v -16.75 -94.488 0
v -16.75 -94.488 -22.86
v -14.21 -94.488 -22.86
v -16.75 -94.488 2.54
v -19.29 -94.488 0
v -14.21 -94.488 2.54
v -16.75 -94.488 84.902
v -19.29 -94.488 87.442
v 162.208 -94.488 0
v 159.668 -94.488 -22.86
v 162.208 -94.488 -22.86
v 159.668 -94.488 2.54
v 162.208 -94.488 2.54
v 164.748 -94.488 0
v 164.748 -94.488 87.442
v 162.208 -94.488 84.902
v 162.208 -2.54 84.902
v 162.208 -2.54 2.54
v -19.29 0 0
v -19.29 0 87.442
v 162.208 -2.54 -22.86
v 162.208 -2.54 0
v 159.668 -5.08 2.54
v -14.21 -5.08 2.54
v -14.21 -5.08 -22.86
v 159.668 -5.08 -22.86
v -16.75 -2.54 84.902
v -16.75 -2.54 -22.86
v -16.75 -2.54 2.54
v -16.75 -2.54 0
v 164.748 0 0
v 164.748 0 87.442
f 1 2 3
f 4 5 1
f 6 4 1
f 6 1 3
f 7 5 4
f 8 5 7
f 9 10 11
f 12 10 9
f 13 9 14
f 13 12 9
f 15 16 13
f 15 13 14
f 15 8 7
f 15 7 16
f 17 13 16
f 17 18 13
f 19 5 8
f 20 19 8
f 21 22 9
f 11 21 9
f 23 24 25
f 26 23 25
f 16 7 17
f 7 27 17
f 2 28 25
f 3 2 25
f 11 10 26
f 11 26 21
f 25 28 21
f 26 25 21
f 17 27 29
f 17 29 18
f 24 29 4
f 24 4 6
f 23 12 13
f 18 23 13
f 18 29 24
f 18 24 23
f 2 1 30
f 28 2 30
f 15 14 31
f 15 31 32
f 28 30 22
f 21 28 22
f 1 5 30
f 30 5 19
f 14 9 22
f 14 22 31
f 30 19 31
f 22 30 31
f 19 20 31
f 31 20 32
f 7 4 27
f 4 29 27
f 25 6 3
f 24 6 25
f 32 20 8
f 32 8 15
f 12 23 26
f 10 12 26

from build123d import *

# Parameters (mm, degrees)
F0_W        = 184.0382497758
F0_H        = 87.4423235655
F1_DEPTH    = 94.488
F2_T        = -2.54
F3_DEPTH    = 25.4
F4_T        = 2.54
F4_T3_DEPTH = 97.028
F4_T5_DEPTH = 184.0382497758
F4_T7_DEPTH = 87.4423235655


# Not quite as in the source:
# - a shell that OpenCascade refuses in one call is made with other operations: the cavity is built on its own and cut out


with BuildPart() as f1:
    # F0 (on Front) → F1 (new body)
    with BuildSketch(Plane.XZ):
        with Locations((72.7289924398, 43.7211617827)):
            Rectangle(F0_W, F0_H)
    extrude(amount=F1_DEPTH)

    # F2
    f2_openings = [f1.faces().sort_by_distance(p)[0] for p in [
        (72.728992, -94.488, 43.721162),
    ]]
    offset(amount=F2_T, openings=f2_openings)

    # F3 (add): a face of the model
    f3_faces = [f1.faces().sort_by_distance(p)[0] for p in [
        (72.7289924398, -48.514, 2.54),
    ]]
    extrude(f3_faces, amount=-F3_DEPTH)

    # F4: shell of thickness 2.54, made by hand


with BuildPart() as f4_core1:
    # F4_t2: copy of F1
    add(f1.part)

    # the walls: a layer under each face that stays
    f4_faces = [f4_core1.faces().sort_by_distance(p)[0] for p in [
        (-19.2901324481, -47.244, 43.7211617827),
        (72.7289924398, -47.244, 87.4423235655),
        (104.36056662, -2.333037037, 0),
        (72.7289924398, 0, 43.7211617827),
        (164.7481173277, -47.244, 43.7211617827),
        (162.2081173277, -48.514, -11.43),
        (72.7289924398, -2.54, -11.43),
        (-16.7501324481, -48.514, -11.43),
        (162.2081173277, -48.514, 43.7211617827),
        (72.7289924398, -48.514, 84.9023235655),
        (-16.7501324481, -48.514, 43.7211617827),
        (72.7289924398, -2.54, 43.7211617827),
    ]]
    thicken(f4_faces, amount=-F4_T, mode=Mode.SUBTRACT)

    # F4_s4 → F4_t3 (cut)
    with BuildSketch(Plane.XZ):
        Polygon((162.2335173277, -0.0254), (162.2081173277, 2.54), (159.6681173277, 2.54), (159.6681173277, 0), align=None)
        Polygon((-16.7755324481, -0.0254), (-16.7501324481, 2.54), (-14.2101324481, 2.54), (-14.2101324481, 0), align=None)
        Polygon((162.1827173277, 84.8769235655), (164.7481173277, 84.9023235655), (164.7481173277, 87.4423235655), (162.2081173277, 87.4423235655), align=None)
        Polygon((-16.7247324481, 84.8769235655), (-16.7501324481, 87.4423235655), (-19.2901324481, 87.4423235655), (-19.2901324481, 84.9023235655), align=None)
    extrude(amount=F4_T3_DEPTH, mode=Mode.SUBTRACT)

    # F4_s6 → F4_t5 (cut)
    with BuildSketch(Plane.YZ.offset(-19.2901324481)):
        Polygon((-2.5146, -0.0254), (-2.54, 2.54), (-5.08, 2.54), (-5.08, 0), align=None)
        Polygon((-2.5654, 84.8769235655), (-2.54, 87.4423235655), (0, 87.4423235655), (0, 84.9023235655), align=None)
    extrude(amount=F4_T5_DEPTH, mode=Mode.SUBTRACT)

    # F4_s8 → F4_t7 (cut)
    with BuildSketch(Plane.XY):
        Polygon((162.1827173277, -2.5654), (164.7481173277, -2.54), (164.7481173277, 0), (162.2081173277, 0), align=None)
        Polygon((-16.7247324481, -2.5654), (-19.2901324481, -2.54), (-19.2901324481, 0), (-16.7501324481, 0), align=None)
    extrude(amount=F4_T7_DEPTH, mode=Mode.SUBTRACT)


with BuildPart() as f1_1:
    add(f1.part)

    # what is left inside the walls is the cavity
    f4_cavity = [f4_core1.part.solids().sort_by_distance(p)[0] for p in [
        (72.728992, -64.685333, 2.5146),
    ]]
    add(f4_cavity, mode=Mode.SUBTRACT)


solid = f1_1.part
